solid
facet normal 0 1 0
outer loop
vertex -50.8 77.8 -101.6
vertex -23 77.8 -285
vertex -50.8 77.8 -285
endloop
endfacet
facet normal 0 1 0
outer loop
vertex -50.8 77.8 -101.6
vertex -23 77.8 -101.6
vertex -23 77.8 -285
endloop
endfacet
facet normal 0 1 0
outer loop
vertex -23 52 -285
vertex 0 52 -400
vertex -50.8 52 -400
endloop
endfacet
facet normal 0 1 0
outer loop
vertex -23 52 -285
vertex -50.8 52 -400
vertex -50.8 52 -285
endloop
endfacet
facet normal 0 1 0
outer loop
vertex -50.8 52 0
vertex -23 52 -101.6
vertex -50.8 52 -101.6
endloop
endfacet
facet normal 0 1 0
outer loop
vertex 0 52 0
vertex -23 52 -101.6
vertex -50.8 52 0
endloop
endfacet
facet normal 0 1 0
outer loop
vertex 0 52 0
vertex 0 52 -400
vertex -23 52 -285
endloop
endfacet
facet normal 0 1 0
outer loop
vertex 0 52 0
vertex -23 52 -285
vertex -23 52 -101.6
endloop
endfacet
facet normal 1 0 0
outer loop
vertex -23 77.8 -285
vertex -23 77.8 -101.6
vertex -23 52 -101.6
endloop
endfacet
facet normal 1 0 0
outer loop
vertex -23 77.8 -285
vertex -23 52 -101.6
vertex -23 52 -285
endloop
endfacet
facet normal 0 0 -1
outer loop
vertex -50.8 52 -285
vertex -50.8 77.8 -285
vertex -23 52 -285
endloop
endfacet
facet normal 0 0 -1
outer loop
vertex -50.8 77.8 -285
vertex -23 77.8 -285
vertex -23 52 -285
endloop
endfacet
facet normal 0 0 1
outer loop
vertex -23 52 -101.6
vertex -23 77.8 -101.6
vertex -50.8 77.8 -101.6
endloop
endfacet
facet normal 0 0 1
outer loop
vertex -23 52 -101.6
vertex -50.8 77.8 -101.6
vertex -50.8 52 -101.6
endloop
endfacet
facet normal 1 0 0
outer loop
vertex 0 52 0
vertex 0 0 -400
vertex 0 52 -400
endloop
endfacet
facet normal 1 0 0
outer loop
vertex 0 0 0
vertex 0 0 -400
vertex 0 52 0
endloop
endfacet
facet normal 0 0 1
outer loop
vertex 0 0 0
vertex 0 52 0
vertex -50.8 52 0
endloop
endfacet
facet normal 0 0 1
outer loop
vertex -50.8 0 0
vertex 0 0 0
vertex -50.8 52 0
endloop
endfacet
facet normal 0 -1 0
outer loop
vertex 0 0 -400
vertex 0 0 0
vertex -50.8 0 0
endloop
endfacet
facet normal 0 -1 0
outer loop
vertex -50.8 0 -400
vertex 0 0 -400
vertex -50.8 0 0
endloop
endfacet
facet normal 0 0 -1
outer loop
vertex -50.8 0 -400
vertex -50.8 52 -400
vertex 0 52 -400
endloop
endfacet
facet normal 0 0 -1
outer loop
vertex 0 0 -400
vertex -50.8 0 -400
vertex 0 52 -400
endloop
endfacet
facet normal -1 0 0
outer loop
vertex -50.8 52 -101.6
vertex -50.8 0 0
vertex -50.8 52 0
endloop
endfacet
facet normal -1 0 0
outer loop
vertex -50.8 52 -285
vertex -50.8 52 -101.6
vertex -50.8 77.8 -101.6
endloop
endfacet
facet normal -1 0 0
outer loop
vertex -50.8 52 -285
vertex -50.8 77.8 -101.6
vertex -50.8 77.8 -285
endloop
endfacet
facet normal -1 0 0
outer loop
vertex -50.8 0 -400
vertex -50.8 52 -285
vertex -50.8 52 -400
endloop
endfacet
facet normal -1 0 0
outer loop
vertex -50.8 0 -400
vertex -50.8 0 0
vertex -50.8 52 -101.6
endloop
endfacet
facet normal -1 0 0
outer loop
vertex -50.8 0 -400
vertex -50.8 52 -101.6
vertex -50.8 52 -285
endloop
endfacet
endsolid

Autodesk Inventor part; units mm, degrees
ref_plane "YZ Plane" through (0, 0, 0) normal (1, 0, 0) x (0, 1, 0)
ref_plane "XZ Plane" through (0, 0, 0) normal (0, 1, 0) x (-1, 0, 0)
ref_plane "XY Plane" through (0, 0, 0) normal (0, 0, 1) x (1, 0, 0)
sketch "Sketch1" plane through (0, 0, 0) normal (0, 1, 0) x (-1, 0, 0)
  line L0 (0, 0) -> (50.8, 0)
  line L1 (50.8, 0) -> (50.8, -400)
  line L2 (50.8, -400) -> (0, -400)
  line L3 (0, -400) -> (0, 0)
  dimension "d0" = 50.8
  dimension "d1" = 400
extrude "Extrusion1" add sketch "Sketch1" along normal blind 77.8
sketch "Sketch3" plane through (0, 0, 0) normal (1, 0, 0) x (0, 0, -1)
  line L0 (0, 77.8) -> (101.6, 77.8)
  line L1 (101.6, 77.8) -> (101.6, 52)
  line L2 (101.6, 52) -> (0, 52)
  line L3 (0, 52) -> (0, 77.8)
  line L4 (0, 77.8) -> (400, 77.8) projected
  line L5 (400, 77.8) -> (285, 77.8)
  line L6 (285, 77.8) -> (285, 52)
  line L7 (285, 52) -> (400, 52)
  line L8 (400, 52) -> (400, 77.8)
  point P0 (0, 0)
  dimension "d8" = 101.6
  dimension "d9" = 25.8
  dimension "d10" = 115
  dimension "d11" = 25.8
extrude "Extrusion2" cut sketch "Sketch3" against normal blind 50.8
sketch "Sketch4" plane through (0, 77.8, 0) normal (0, 1, 0) x (1, 0, 0)
  line L0 (0, 101.6) -> (0, 285) projected
  line L1 (0, 285) -> (-50.8, 285) projected
  line L2 (0, 101.6) -> (-23, 101.6)
  line L3 (-23, 101.6) -> (-23, 285)
  line L4 (-23, 285) -> (0, 285)
  line L5 (0, 285) -> (0, 101.6)
  point P0 (0, 0)
  dimension "d14" = 23
extrude "Extrusion3" cut sketch "Sketch4" against normal blind 25.8
properties part number "PiezaPuerta-1"
